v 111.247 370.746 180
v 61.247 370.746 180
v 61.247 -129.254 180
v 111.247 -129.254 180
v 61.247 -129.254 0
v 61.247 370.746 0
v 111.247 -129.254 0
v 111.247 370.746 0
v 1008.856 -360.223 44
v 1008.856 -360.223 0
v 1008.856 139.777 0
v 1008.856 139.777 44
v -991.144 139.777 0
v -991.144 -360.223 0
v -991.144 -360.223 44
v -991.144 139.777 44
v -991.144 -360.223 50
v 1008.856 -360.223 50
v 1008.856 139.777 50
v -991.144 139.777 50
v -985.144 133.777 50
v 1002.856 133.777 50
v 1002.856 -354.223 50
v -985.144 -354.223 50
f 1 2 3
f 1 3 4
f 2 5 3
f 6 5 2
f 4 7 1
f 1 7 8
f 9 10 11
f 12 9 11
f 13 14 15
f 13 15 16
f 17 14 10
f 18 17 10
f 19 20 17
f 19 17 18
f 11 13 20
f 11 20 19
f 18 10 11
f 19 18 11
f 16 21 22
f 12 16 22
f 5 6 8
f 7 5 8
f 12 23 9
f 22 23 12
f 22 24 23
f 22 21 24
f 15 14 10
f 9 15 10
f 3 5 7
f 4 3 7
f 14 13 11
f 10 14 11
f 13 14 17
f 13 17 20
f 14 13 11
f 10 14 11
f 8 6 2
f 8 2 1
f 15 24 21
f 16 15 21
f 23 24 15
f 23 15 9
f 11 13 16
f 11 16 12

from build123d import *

# Parameters (mm, degrees)
F0_W     = 2000
F0_H     = 500
F1_DEPTH = 50
F2_W     = 50
F2_H     = 500
F3_DEPTH = 180
F5_SIZE  = 6


with BuildPart() as f1:
    # F0 (on Top) → F1 (new body)
    with BuildSketch(Plane.XY):
        with Locations((8.8558830321, -110.2227519286)):
            Rectangle(F0_W, F0_H)
    extrude(amount=F1_DEPTH)


with BuildPart() as f3:
    # F2 (on Top) → F3 (new body)
    with BuildSketch(Plane.XY):
        with Locations((86.2466022372, 120.7464857791)):
            Rectangle(F2_W, F2_H)
    extrude(amount=F3_DEPTH)


with BuildPart() as f4_1:
    # F4: copy of F1
    add(f1.part)


with BuildPart() as f1_1:
    add(f1.part)

    # F5
    f5_edges = [f1_1.edges().sort_by_distance(p)[0] for p in [
        (8.855883, -360.222752, 50),
        (-991.144117, -110.222752, 50),
        (8.855883, 139.777248, 50),
        (1008.855883, -110.222752, 50),
    ]]
    chamfer(f5_edges, length=F5_SIZE)


solid = Compound([f3.part, f4_1.part, f1_1.part])
